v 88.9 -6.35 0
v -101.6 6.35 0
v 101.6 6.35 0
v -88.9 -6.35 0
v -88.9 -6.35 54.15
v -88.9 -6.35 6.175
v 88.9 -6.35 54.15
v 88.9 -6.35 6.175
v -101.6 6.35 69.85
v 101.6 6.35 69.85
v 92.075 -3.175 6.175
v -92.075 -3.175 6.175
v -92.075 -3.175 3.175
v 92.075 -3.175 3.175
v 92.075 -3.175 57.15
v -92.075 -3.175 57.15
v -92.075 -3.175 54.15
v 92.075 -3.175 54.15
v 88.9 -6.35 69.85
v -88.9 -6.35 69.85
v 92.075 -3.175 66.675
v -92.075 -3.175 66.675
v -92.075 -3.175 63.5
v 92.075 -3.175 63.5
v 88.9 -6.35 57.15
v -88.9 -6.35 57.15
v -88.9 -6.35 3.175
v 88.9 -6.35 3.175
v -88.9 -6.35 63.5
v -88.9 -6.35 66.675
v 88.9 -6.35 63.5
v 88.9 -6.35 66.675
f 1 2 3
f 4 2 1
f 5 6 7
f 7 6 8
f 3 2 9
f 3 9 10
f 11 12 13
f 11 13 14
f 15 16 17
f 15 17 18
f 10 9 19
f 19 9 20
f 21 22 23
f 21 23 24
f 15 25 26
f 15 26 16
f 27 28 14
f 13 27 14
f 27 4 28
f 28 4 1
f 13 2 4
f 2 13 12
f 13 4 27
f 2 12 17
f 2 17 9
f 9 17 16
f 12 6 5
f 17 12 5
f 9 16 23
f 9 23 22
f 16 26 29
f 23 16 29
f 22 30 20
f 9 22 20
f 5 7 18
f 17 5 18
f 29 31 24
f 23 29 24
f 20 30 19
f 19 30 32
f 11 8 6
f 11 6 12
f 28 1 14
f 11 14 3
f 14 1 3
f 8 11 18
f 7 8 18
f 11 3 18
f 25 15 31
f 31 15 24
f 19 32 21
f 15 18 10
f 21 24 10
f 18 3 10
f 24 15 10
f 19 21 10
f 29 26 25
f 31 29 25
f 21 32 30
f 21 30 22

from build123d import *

# Parameters (mm, degrees)
SKETCH2_W           = 203.2
SKETCH2_H           = 12.7
BOSS_EXTRUDE1_DEPTH = 69.85
CHAMFER1_SIZE       = 12.7
SKETCH3_W           = 203.2
SKETCH3_H           = 3.175
SKETCH3_H_2         = 3.000000096
CUT_EXTRUDE2_DEPTH  = 3.175


with BuildPart() as part:
    # Sketch2 → Boss-Extrude1 (new body)
    with BuildSketch(Plane.XY):
        Rectangle(SKETCH2_W, SKETCH2_H)
    extrude(amount=BOSS_EXTRUDE1_DEPTH)

    # Chamfer1
    chamfer1_edges = [part.edges().sort_by_distance(p)[0] for p in [
        (-101.6, -6.35, 34.925),
        (101.6, -6.35, 34.925),
    ]]
    chamfer(chamfer1_edges, length=CHAMFER1_SIZE - 0.0001)  # a hair under: the kernel refuses the full size

    # Sketch3 → Cut-Extrude2 (cut)
    with BuildSketch(Plane.XZ.offset(6.35)):
        with Locations((0, 65.0875)):
            Rectangle(SKETCH3_W, SKETCH3_H)
        with Locations((0, 4.675000048)):
            Rectangle(SKETCH3_W, SKETCH3_H_2)
        with Locations((0, 55.649999952)):
            Rectangle(SKETCH3_W, SKETCH3_H_2)
    extrude(amount=-CUT_EXTRUDE2_DEPTH, mode=Mode.SUBTRACT)


solid = part.part
